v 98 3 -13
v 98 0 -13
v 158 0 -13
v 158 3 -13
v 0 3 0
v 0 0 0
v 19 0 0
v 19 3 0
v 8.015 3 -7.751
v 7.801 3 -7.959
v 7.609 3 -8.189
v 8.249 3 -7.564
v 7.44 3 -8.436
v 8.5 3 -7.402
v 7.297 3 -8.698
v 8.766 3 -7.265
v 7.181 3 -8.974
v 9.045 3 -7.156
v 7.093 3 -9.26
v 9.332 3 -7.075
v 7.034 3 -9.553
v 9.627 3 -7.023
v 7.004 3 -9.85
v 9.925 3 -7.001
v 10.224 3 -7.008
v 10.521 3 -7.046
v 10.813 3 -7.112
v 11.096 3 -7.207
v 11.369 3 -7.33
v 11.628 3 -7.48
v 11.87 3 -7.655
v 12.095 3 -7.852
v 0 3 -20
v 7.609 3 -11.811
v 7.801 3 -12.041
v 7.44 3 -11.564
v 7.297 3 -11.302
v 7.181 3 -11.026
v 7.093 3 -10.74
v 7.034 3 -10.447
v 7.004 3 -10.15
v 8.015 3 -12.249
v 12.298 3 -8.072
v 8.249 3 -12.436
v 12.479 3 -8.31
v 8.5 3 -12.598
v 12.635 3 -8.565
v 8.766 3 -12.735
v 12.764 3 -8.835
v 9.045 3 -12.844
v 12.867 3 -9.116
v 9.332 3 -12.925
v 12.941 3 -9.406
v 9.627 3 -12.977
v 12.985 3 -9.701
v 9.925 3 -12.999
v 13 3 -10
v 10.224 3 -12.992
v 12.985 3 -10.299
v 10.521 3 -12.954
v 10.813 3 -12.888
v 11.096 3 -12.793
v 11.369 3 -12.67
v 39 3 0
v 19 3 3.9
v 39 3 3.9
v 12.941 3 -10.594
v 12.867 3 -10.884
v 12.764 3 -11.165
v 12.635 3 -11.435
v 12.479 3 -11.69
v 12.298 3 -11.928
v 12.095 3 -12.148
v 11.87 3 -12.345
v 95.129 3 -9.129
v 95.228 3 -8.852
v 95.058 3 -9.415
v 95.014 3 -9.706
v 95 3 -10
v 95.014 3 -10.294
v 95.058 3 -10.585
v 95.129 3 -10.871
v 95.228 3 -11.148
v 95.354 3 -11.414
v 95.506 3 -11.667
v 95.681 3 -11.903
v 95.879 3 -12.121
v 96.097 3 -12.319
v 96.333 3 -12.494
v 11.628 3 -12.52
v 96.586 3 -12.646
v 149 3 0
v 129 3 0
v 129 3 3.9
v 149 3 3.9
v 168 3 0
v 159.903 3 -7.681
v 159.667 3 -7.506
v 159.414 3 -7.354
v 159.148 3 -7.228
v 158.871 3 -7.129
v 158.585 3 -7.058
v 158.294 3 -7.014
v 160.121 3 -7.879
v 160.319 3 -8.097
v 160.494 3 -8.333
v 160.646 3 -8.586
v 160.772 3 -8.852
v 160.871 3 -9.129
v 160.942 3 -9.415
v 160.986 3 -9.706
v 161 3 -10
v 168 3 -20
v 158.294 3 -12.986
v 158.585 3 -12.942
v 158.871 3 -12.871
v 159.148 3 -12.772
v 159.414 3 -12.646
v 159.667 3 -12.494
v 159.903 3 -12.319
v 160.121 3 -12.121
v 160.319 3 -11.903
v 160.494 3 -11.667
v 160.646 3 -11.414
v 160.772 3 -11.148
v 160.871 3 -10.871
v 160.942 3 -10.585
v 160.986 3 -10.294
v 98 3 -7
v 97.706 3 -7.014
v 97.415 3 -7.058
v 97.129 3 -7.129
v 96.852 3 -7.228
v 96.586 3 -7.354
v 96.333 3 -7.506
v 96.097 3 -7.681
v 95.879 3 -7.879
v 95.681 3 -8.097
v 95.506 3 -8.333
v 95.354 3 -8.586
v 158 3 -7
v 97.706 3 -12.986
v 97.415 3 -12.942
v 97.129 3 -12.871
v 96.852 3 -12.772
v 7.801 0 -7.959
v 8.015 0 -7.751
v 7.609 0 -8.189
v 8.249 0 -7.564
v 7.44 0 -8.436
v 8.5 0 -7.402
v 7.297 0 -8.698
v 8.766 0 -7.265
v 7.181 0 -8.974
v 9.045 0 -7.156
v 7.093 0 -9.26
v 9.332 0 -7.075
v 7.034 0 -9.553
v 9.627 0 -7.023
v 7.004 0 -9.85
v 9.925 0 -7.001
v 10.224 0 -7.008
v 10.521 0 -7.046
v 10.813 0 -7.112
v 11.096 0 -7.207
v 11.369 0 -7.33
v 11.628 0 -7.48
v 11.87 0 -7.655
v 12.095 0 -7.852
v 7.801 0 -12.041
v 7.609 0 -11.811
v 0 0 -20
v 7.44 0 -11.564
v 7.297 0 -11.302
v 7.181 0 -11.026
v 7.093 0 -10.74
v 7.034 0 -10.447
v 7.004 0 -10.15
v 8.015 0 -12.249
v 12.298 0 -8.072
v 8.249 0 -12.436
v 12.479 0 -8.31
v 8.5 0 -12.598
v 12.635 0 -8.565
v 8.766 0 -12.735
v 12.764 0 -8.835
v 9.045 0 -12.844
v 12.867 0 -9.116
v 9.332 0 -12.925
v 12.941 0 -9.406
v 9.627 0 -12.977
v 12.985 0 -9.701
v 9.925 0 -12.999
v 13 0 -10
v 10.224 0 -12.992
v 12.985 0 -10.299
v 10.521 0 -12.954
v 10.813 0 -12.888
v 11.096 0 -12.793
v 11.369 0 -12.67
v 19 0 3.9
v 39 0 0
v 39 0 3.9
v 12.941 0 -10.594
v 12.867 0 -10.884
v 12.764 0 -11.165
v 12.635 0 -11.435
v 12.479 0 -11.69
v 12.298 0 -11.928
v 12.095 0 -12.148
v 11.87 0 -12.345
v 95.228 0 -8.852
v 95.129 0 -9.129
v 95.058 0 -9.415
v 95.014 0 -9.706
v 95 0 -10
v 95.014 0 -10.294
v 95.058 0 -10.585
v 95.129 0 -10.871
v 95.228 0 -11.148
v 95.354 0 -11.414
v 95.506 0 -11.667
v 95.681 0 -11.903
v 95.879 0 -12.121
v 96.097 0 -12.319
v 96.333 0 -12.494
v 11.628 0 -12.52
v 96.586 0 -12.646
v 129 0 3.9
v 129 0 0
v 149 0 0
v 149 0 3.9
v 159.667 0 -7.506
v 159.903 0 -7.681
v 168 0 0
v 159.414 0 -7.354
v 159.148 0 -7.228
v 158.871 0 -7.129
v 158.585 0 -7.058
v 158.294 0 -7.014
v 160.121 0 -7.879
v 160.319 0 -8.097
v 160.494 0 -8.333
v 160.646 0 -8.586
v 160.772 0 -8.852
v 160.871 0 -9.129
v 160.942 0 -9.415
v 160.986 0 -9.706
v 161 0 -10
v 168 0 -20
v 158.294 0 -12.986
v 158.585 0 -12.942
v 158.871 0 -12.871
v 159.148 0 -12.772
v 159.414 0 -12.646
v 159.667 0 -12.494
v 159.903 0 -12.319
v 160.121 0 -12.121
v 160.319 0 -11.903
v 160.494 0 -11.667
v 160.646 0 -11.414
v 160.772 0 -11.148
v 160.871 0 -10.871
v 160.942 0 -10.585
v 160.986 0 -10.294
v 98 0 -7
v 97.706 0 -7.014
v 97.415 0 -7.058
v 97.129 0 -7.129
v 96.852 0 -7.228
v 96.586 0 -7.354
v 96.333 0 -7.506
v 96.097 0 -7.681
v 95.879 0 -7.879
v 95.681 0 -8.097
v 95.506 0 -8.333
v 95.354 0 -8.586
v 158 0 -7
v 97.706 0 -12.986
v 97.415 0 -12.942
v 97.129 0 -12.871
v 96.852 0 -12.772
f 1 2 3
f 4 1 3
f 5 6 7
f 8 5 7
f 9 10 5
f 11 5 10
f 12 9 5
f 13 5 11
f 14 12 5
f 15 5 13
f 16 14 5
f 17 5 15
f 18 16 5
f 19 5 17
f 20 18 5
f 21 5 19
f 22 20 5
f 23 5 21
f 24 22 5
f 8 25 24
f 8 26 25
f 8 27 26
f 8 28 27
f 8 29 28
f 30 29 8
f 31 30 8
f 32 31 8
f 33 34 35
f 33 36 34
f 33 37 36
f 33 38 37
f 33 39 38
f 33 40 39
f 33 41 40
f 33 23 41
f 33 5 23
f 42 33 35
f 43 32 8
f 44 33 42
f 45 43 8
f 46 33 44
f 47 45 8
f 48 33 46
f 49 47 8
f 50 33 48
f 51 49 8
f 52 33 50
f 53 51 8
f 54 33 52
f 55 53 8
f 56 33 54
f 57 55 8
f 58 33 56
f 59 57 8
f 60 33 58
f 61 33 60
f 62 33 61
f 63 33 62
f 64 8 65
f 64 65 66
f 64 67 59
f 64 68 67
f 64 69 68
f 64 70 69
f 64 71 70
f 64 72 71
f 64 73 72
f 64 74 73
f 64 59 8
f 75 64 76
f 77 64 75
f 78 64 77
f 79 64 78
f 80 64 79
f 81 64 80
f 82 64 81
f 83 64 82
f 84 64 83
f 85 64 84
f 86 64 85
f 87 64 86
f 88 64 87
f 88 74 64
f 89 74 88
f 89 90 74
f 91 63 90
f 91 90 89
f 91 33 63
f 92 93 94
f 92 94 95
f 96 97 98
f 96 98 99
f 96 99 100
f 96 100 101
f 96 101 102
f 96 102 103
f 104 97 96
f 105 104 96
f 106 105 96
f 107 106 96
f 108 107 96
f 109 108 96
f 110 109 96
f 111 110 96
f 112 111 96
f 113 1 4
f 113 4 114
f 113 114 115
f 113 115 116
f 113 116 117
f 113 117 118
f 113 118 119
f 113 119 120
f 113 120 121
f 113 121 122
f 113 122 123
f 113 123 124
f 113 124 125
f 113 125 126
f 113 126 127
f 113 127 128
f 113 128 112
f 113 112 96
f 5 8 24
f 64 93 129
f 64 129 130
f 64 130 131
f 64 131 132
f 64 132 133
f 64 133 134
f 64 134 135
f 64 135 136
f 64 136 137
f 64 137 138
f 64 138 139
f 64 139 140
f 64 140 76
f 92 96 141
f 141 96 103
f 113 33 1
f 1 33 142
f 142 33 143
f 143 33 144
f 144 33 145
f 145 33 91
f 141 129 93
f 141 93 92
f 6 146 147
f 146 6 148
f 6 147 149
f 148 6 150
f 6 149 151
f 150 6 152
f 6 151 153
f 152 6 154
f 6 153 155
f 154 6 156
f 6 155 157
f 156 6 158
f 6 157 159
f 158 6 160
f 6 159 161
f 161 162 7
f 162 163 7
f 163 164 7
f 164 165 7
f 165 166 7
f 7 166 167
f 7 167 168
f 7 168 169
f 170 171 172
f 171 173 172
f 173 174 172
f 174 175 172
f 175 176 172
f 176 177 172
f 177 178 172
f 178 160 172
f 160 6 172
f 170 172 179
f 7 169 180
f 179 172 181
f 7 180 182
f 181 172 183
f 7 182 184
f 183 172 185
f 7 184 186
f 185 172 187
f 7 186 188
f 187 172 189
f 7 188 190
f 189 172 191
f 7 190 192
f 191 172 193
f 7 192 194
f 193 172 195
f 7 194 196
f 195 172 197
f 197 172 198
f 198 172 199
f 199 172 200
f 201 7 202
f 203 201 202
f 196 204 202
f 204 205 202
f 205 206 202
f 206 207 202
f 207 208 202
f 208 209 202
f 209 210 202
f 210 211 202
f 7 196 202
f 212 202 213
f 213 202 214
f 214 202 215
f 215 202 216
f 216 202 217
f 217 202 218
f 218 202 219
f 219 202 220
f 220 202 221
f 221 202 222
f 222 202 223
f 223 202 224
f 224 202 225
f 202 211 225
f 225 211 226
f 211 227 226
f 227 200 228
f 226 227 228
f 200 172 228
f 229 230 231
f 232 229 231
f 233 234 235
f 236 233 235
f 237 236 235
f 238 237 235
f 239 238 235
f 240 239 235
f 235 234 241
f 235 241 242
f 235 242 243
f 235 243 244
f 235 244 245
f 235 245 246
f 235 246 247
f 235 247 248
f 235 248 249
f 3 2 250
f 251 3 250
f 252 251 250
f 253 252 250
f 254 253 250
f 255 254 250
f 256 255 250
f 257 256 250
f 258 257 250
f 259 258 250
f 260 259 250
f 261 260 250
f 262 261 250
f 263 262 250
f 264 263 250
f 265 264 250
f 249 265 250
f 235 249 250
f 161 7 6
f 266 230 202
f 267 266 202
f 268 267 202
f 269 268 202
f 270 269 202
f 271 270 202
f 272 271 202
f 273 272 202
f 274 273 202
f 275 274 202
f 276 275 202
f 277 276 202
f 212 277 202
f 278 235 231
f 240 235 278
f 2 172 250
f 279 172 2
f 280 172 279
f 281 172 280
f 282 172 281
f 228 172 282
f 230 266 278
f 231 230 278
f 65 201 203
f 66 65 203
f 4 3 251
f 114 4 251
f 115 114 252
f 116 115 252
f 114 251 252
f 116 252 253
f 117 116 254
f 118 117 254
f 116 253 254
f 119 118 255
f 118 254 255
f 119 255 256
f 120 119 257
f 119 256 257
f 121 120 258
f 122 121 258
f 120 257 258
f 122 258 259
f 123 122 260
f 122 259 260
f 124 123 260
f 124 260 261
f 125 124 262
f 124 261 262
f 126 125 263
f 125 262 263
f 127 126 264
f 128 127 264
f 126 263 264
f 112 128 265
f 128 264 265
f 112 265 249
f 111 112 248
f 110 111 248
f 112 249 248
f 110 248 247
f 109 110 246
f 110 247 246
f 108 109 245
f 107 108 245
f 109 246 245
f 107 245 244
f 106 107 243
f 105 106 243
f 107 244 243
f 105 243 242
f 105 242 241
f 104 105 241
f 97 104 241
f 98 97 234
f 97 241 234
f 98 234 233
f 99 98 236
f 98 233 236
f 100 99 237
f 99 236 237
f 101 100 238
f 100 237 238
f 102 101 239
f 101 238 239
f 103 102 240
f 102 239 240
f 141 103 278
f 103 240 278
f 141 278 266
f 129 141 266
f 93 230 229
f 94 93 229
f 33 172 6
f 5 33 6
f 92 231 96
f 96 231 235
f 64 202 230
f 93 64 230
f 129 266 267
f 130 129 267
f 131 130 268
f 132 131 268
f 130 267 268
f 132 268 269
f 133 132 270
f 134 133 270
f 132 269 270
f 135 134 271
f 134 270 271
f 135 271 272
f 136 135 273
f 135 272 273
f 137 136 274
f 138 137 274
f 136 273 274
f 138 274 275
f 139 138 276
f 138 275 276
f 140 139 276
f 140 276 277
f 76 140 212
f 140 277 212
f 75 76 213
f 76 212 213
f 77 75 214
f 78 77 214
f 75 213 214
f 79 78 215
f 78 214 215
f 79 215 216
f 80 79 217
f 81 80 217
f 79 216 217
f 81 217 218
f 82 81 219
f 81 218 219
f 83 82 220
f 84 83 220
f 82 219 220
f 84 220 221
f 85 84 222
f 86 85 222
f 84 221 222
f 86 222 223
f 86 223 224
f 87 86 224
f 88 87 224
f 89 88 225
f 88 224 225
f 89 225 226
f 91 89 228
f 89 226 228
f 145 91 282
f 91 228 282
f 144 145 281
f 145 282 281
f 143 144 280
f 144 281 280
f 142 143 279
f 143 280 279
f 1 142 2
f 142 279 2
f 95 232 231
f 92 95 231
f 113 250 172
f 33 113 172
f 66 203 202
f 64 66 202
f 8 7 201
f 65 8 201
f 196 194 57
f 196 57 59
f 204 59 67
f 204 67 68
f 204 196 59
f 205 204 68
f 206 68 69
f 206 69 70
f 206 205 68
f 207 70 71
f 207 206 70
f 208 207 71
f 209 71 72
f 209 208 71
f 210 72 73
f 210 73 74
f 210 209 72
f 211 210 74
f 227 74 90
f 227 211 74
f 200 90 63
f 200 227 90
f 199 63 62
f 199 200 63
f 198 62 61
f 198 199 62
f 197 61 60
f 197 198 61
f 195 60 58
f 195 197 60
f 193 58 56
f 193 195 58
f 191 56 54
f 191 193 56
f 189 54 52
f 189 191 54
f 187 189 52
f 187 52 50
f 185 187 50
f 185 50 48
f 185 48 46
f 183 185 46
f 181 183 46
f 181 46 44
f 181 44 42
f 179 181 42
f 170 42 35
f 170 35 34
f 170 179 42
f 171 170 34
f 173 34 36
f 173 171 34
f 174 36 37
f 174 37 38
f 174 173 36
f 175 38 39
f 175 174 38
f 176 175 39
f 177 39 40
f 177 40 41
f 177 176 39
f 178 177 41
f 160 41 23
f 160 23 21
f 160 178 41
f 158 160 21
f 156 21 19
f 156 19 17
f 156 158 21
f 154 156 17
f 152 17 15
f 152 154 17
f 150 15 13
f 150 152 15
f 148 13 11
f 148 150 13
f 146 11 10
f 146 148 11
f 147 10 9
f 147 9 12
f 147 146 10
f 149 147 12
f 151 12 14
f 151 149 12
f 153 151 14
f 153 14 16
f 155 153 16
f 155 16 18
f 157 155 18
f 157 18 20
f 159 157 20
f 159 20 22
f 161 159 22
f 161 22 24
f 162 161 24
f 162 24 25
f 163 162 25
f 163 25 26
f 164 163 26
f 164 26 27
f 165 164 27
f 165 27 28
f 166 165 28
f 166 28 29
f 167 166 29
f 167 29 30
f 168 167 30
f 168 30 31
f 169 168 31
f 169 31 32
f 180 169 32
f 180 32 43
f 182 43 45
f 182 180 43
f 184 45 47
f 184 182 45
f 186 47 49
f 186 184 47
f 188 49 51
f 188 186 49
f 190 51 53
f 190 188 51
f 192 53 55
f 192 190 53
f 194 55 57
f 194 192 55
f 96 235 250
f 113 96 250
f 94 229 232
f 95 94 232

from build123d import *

# Parameters (mm, degrees)
SKETCH1_R           = 3
BOSS_EXTRUDE1_DEPTH = 3


with BuildPart() as part:
    # Sketch1 → Boss-Extrude1 (new body)
    with BuildSketch(Plane(origin=(0, 0, 0), x_dir=(1, 0, 0), z_dir=(0, 1, 0))):
        Polygon((0, 0), (19, 0), (19, -3.9), (39, -3.9), (39, 0), (129, 0), (129, -3.9), (149, -3.9), (149, 0), (168, 0), (168, 20), (0, 20), align=None)
        with Locations((10, 10)):
            Circle(SKETCH1_R, mode=Mode.SUBTRACT)
        with BuildLine():
            Line((158, 7), (98, 7))
            ThreePointArc((98, 7), (95, 10), (98, 13))
            Line((98, 13), (158, 13))
            ThreePointArc((158, 13), (161, 10), (158, 7))
        make_face(mode=Mode.SUBTRACT)
    extrude(amount=BOSS_EXTRUDE1_DEPTH)


solid = part.part
